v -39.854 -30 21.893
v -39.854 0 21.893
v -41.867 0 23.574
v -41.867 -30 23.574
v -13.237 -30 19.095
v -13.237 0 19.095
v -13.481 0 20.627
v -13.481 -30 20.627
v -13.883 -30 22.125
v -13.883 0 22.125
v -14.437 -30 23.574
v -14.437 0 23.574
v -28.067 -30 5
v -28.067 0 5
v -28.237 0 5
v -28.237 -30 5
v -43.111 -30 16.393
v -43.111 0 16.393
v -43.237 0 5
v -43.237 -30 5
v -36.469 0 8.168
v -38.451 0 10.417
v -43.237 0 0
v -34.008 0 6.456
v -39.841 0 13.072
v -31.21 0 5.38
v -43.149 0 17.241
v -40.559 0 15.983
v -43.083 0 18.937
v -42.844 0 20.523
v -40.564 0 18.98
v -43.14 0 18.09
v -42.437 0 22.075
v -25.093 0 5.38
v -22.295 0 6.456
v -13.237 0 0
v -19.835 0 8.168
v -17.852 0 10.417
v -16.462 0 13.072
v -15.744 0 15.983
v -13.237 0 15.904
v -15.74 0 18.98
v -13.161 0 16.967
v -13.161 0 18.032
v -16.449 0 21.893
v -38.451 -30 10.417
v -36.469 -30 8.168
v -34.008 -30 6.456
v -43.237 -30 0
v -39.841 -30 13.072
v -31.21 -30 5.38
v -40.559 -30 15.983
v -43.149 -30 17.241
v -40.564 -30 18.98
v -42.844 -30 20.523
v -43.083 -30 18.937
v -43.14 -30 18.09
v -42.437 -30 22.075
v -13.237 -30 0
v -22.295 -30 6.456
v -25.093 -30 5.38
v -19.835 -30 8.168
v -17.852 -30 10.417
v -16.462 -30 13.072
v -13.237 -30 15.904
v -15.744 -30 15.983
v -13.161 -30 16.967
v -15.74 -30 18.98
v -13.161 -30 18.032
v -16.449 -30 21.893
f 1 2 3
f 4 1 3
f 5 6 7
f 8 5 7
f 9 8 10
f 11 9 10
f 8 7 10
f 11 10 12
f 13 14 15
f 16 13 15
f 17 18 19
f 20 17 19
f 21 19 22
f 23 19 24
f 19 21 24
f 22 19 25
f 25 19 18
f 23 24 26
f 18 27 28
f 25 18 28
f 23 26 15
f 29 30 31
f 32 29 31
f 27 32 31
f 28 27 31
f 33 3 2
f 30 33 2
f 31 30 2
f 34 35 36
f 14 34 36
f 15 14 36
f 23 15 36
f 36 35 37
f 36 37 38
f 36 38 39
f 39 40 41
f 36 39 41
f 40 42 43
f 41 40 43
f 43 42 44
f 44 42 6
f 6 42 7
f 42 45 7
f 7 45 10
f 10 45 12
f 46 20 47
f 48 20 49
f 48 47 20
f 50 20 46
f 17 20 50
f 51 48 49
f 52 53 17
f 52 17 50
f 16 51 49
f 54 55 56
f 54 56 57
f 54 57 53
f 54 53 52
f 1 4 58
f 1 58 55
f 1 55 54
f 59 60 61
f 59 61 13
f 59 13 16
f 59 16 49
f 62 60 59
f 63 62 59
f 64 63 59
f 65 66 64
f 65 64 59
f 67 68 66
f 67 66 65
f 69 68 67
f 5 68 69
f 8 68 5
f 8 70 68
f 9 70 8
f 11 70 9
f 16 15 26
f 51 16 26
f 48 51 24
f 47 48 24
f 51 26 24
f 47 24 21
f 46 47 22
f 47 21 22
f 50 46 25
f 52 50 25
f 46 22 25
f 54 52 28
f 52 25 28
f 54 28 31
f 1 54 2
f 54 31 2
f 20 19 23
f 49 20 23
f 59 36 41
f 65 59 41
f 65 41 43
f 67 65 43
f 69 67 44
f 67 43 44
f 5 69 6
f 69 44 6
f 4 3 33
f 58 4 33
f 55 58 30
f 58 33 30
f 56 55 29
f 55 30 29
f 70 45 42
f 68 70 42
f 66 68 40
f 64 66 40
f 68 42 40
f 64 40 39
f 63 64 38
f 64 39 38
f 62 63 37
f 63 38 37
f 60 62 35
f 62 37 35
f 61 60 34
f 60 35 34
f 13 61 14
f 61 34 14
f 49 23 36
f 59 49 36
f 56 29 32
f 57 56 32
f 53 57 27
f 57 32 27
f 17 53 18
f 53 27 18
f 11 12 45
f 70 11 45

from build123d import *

# Parameters (mm, degrees)
F1_DEPTH = 30


with BuildPart() as f1:
    # F0 (on Front) → F1 (new body)
    with BuildSketch(Plane.XZ):
        with BuildLine():
            Line((-43.236702, 0), (-13.236702, 0))
            Line((-13.236702, 0), (-13.236702, 5))
            Line((-13.236702, 5), (-13.236702, 15.904253))
            Line((-13.236702, 15.904253), (-13.236702, 19.095168))
            ThreePointArc((-13.236702, 19.095168), (-13.662541, 21.381314), (-14.43662, 23.574167))
            Line((-14.43662, 23.574167), (-16.449004, 21.892771))
            ThreePointArc((-16.449004, 21.892771), (-17.85215, 10.416553), (-28.06652, 5))
            ThreePointArc((-28.06652, 5), (-28.151611, 4.99971), (-28.236702, 5))
            ThreePointArc((-28.236702, 5), (-38.451071, 10.416553), (-39.854218, 21.892771))
            Line((-39.854218, 21.892771), (-41.866602, 23.574167))
            ThreePointArc((-41.866602, 23.574167), (-42.661058, 21.304438), (-43.0826, 18.936921))
            Line((-43.0826, 18.936921), (-43.110728, 16.392998))
            Line((-43.110728, 16.392998), (-43.236702, 5))
            Line((-43.236702, 5), (-43.236702, 0))
        make_face()
        with BuildLine():
            Line((-13.236702, 19.095168), (-13.236702, 15.904253))
            ThreePointArc((-13.236702, 15.904253), (-13.151611, 17.49971), (-13.236702, 19.095168))
        make_face()
        with BuildLine():
            ThreePointArc((-43.0826, 18.936921), (-43.150694, 17.665557), (-43.110728, 16.392998))
            Line((-43.110728, 16.392998), (-43.0826, 18.936921))
        make_face()
        with BuildLine():
            ThreePointArc((-28.236702, 5), (-28.151611, 4.99971), (-28.06652, 5))
            Line((-28.06652, 5), (-28.236702, 5))
        make_face()
    extrude(amount=F1_DEPTH)


solid = f1.part
